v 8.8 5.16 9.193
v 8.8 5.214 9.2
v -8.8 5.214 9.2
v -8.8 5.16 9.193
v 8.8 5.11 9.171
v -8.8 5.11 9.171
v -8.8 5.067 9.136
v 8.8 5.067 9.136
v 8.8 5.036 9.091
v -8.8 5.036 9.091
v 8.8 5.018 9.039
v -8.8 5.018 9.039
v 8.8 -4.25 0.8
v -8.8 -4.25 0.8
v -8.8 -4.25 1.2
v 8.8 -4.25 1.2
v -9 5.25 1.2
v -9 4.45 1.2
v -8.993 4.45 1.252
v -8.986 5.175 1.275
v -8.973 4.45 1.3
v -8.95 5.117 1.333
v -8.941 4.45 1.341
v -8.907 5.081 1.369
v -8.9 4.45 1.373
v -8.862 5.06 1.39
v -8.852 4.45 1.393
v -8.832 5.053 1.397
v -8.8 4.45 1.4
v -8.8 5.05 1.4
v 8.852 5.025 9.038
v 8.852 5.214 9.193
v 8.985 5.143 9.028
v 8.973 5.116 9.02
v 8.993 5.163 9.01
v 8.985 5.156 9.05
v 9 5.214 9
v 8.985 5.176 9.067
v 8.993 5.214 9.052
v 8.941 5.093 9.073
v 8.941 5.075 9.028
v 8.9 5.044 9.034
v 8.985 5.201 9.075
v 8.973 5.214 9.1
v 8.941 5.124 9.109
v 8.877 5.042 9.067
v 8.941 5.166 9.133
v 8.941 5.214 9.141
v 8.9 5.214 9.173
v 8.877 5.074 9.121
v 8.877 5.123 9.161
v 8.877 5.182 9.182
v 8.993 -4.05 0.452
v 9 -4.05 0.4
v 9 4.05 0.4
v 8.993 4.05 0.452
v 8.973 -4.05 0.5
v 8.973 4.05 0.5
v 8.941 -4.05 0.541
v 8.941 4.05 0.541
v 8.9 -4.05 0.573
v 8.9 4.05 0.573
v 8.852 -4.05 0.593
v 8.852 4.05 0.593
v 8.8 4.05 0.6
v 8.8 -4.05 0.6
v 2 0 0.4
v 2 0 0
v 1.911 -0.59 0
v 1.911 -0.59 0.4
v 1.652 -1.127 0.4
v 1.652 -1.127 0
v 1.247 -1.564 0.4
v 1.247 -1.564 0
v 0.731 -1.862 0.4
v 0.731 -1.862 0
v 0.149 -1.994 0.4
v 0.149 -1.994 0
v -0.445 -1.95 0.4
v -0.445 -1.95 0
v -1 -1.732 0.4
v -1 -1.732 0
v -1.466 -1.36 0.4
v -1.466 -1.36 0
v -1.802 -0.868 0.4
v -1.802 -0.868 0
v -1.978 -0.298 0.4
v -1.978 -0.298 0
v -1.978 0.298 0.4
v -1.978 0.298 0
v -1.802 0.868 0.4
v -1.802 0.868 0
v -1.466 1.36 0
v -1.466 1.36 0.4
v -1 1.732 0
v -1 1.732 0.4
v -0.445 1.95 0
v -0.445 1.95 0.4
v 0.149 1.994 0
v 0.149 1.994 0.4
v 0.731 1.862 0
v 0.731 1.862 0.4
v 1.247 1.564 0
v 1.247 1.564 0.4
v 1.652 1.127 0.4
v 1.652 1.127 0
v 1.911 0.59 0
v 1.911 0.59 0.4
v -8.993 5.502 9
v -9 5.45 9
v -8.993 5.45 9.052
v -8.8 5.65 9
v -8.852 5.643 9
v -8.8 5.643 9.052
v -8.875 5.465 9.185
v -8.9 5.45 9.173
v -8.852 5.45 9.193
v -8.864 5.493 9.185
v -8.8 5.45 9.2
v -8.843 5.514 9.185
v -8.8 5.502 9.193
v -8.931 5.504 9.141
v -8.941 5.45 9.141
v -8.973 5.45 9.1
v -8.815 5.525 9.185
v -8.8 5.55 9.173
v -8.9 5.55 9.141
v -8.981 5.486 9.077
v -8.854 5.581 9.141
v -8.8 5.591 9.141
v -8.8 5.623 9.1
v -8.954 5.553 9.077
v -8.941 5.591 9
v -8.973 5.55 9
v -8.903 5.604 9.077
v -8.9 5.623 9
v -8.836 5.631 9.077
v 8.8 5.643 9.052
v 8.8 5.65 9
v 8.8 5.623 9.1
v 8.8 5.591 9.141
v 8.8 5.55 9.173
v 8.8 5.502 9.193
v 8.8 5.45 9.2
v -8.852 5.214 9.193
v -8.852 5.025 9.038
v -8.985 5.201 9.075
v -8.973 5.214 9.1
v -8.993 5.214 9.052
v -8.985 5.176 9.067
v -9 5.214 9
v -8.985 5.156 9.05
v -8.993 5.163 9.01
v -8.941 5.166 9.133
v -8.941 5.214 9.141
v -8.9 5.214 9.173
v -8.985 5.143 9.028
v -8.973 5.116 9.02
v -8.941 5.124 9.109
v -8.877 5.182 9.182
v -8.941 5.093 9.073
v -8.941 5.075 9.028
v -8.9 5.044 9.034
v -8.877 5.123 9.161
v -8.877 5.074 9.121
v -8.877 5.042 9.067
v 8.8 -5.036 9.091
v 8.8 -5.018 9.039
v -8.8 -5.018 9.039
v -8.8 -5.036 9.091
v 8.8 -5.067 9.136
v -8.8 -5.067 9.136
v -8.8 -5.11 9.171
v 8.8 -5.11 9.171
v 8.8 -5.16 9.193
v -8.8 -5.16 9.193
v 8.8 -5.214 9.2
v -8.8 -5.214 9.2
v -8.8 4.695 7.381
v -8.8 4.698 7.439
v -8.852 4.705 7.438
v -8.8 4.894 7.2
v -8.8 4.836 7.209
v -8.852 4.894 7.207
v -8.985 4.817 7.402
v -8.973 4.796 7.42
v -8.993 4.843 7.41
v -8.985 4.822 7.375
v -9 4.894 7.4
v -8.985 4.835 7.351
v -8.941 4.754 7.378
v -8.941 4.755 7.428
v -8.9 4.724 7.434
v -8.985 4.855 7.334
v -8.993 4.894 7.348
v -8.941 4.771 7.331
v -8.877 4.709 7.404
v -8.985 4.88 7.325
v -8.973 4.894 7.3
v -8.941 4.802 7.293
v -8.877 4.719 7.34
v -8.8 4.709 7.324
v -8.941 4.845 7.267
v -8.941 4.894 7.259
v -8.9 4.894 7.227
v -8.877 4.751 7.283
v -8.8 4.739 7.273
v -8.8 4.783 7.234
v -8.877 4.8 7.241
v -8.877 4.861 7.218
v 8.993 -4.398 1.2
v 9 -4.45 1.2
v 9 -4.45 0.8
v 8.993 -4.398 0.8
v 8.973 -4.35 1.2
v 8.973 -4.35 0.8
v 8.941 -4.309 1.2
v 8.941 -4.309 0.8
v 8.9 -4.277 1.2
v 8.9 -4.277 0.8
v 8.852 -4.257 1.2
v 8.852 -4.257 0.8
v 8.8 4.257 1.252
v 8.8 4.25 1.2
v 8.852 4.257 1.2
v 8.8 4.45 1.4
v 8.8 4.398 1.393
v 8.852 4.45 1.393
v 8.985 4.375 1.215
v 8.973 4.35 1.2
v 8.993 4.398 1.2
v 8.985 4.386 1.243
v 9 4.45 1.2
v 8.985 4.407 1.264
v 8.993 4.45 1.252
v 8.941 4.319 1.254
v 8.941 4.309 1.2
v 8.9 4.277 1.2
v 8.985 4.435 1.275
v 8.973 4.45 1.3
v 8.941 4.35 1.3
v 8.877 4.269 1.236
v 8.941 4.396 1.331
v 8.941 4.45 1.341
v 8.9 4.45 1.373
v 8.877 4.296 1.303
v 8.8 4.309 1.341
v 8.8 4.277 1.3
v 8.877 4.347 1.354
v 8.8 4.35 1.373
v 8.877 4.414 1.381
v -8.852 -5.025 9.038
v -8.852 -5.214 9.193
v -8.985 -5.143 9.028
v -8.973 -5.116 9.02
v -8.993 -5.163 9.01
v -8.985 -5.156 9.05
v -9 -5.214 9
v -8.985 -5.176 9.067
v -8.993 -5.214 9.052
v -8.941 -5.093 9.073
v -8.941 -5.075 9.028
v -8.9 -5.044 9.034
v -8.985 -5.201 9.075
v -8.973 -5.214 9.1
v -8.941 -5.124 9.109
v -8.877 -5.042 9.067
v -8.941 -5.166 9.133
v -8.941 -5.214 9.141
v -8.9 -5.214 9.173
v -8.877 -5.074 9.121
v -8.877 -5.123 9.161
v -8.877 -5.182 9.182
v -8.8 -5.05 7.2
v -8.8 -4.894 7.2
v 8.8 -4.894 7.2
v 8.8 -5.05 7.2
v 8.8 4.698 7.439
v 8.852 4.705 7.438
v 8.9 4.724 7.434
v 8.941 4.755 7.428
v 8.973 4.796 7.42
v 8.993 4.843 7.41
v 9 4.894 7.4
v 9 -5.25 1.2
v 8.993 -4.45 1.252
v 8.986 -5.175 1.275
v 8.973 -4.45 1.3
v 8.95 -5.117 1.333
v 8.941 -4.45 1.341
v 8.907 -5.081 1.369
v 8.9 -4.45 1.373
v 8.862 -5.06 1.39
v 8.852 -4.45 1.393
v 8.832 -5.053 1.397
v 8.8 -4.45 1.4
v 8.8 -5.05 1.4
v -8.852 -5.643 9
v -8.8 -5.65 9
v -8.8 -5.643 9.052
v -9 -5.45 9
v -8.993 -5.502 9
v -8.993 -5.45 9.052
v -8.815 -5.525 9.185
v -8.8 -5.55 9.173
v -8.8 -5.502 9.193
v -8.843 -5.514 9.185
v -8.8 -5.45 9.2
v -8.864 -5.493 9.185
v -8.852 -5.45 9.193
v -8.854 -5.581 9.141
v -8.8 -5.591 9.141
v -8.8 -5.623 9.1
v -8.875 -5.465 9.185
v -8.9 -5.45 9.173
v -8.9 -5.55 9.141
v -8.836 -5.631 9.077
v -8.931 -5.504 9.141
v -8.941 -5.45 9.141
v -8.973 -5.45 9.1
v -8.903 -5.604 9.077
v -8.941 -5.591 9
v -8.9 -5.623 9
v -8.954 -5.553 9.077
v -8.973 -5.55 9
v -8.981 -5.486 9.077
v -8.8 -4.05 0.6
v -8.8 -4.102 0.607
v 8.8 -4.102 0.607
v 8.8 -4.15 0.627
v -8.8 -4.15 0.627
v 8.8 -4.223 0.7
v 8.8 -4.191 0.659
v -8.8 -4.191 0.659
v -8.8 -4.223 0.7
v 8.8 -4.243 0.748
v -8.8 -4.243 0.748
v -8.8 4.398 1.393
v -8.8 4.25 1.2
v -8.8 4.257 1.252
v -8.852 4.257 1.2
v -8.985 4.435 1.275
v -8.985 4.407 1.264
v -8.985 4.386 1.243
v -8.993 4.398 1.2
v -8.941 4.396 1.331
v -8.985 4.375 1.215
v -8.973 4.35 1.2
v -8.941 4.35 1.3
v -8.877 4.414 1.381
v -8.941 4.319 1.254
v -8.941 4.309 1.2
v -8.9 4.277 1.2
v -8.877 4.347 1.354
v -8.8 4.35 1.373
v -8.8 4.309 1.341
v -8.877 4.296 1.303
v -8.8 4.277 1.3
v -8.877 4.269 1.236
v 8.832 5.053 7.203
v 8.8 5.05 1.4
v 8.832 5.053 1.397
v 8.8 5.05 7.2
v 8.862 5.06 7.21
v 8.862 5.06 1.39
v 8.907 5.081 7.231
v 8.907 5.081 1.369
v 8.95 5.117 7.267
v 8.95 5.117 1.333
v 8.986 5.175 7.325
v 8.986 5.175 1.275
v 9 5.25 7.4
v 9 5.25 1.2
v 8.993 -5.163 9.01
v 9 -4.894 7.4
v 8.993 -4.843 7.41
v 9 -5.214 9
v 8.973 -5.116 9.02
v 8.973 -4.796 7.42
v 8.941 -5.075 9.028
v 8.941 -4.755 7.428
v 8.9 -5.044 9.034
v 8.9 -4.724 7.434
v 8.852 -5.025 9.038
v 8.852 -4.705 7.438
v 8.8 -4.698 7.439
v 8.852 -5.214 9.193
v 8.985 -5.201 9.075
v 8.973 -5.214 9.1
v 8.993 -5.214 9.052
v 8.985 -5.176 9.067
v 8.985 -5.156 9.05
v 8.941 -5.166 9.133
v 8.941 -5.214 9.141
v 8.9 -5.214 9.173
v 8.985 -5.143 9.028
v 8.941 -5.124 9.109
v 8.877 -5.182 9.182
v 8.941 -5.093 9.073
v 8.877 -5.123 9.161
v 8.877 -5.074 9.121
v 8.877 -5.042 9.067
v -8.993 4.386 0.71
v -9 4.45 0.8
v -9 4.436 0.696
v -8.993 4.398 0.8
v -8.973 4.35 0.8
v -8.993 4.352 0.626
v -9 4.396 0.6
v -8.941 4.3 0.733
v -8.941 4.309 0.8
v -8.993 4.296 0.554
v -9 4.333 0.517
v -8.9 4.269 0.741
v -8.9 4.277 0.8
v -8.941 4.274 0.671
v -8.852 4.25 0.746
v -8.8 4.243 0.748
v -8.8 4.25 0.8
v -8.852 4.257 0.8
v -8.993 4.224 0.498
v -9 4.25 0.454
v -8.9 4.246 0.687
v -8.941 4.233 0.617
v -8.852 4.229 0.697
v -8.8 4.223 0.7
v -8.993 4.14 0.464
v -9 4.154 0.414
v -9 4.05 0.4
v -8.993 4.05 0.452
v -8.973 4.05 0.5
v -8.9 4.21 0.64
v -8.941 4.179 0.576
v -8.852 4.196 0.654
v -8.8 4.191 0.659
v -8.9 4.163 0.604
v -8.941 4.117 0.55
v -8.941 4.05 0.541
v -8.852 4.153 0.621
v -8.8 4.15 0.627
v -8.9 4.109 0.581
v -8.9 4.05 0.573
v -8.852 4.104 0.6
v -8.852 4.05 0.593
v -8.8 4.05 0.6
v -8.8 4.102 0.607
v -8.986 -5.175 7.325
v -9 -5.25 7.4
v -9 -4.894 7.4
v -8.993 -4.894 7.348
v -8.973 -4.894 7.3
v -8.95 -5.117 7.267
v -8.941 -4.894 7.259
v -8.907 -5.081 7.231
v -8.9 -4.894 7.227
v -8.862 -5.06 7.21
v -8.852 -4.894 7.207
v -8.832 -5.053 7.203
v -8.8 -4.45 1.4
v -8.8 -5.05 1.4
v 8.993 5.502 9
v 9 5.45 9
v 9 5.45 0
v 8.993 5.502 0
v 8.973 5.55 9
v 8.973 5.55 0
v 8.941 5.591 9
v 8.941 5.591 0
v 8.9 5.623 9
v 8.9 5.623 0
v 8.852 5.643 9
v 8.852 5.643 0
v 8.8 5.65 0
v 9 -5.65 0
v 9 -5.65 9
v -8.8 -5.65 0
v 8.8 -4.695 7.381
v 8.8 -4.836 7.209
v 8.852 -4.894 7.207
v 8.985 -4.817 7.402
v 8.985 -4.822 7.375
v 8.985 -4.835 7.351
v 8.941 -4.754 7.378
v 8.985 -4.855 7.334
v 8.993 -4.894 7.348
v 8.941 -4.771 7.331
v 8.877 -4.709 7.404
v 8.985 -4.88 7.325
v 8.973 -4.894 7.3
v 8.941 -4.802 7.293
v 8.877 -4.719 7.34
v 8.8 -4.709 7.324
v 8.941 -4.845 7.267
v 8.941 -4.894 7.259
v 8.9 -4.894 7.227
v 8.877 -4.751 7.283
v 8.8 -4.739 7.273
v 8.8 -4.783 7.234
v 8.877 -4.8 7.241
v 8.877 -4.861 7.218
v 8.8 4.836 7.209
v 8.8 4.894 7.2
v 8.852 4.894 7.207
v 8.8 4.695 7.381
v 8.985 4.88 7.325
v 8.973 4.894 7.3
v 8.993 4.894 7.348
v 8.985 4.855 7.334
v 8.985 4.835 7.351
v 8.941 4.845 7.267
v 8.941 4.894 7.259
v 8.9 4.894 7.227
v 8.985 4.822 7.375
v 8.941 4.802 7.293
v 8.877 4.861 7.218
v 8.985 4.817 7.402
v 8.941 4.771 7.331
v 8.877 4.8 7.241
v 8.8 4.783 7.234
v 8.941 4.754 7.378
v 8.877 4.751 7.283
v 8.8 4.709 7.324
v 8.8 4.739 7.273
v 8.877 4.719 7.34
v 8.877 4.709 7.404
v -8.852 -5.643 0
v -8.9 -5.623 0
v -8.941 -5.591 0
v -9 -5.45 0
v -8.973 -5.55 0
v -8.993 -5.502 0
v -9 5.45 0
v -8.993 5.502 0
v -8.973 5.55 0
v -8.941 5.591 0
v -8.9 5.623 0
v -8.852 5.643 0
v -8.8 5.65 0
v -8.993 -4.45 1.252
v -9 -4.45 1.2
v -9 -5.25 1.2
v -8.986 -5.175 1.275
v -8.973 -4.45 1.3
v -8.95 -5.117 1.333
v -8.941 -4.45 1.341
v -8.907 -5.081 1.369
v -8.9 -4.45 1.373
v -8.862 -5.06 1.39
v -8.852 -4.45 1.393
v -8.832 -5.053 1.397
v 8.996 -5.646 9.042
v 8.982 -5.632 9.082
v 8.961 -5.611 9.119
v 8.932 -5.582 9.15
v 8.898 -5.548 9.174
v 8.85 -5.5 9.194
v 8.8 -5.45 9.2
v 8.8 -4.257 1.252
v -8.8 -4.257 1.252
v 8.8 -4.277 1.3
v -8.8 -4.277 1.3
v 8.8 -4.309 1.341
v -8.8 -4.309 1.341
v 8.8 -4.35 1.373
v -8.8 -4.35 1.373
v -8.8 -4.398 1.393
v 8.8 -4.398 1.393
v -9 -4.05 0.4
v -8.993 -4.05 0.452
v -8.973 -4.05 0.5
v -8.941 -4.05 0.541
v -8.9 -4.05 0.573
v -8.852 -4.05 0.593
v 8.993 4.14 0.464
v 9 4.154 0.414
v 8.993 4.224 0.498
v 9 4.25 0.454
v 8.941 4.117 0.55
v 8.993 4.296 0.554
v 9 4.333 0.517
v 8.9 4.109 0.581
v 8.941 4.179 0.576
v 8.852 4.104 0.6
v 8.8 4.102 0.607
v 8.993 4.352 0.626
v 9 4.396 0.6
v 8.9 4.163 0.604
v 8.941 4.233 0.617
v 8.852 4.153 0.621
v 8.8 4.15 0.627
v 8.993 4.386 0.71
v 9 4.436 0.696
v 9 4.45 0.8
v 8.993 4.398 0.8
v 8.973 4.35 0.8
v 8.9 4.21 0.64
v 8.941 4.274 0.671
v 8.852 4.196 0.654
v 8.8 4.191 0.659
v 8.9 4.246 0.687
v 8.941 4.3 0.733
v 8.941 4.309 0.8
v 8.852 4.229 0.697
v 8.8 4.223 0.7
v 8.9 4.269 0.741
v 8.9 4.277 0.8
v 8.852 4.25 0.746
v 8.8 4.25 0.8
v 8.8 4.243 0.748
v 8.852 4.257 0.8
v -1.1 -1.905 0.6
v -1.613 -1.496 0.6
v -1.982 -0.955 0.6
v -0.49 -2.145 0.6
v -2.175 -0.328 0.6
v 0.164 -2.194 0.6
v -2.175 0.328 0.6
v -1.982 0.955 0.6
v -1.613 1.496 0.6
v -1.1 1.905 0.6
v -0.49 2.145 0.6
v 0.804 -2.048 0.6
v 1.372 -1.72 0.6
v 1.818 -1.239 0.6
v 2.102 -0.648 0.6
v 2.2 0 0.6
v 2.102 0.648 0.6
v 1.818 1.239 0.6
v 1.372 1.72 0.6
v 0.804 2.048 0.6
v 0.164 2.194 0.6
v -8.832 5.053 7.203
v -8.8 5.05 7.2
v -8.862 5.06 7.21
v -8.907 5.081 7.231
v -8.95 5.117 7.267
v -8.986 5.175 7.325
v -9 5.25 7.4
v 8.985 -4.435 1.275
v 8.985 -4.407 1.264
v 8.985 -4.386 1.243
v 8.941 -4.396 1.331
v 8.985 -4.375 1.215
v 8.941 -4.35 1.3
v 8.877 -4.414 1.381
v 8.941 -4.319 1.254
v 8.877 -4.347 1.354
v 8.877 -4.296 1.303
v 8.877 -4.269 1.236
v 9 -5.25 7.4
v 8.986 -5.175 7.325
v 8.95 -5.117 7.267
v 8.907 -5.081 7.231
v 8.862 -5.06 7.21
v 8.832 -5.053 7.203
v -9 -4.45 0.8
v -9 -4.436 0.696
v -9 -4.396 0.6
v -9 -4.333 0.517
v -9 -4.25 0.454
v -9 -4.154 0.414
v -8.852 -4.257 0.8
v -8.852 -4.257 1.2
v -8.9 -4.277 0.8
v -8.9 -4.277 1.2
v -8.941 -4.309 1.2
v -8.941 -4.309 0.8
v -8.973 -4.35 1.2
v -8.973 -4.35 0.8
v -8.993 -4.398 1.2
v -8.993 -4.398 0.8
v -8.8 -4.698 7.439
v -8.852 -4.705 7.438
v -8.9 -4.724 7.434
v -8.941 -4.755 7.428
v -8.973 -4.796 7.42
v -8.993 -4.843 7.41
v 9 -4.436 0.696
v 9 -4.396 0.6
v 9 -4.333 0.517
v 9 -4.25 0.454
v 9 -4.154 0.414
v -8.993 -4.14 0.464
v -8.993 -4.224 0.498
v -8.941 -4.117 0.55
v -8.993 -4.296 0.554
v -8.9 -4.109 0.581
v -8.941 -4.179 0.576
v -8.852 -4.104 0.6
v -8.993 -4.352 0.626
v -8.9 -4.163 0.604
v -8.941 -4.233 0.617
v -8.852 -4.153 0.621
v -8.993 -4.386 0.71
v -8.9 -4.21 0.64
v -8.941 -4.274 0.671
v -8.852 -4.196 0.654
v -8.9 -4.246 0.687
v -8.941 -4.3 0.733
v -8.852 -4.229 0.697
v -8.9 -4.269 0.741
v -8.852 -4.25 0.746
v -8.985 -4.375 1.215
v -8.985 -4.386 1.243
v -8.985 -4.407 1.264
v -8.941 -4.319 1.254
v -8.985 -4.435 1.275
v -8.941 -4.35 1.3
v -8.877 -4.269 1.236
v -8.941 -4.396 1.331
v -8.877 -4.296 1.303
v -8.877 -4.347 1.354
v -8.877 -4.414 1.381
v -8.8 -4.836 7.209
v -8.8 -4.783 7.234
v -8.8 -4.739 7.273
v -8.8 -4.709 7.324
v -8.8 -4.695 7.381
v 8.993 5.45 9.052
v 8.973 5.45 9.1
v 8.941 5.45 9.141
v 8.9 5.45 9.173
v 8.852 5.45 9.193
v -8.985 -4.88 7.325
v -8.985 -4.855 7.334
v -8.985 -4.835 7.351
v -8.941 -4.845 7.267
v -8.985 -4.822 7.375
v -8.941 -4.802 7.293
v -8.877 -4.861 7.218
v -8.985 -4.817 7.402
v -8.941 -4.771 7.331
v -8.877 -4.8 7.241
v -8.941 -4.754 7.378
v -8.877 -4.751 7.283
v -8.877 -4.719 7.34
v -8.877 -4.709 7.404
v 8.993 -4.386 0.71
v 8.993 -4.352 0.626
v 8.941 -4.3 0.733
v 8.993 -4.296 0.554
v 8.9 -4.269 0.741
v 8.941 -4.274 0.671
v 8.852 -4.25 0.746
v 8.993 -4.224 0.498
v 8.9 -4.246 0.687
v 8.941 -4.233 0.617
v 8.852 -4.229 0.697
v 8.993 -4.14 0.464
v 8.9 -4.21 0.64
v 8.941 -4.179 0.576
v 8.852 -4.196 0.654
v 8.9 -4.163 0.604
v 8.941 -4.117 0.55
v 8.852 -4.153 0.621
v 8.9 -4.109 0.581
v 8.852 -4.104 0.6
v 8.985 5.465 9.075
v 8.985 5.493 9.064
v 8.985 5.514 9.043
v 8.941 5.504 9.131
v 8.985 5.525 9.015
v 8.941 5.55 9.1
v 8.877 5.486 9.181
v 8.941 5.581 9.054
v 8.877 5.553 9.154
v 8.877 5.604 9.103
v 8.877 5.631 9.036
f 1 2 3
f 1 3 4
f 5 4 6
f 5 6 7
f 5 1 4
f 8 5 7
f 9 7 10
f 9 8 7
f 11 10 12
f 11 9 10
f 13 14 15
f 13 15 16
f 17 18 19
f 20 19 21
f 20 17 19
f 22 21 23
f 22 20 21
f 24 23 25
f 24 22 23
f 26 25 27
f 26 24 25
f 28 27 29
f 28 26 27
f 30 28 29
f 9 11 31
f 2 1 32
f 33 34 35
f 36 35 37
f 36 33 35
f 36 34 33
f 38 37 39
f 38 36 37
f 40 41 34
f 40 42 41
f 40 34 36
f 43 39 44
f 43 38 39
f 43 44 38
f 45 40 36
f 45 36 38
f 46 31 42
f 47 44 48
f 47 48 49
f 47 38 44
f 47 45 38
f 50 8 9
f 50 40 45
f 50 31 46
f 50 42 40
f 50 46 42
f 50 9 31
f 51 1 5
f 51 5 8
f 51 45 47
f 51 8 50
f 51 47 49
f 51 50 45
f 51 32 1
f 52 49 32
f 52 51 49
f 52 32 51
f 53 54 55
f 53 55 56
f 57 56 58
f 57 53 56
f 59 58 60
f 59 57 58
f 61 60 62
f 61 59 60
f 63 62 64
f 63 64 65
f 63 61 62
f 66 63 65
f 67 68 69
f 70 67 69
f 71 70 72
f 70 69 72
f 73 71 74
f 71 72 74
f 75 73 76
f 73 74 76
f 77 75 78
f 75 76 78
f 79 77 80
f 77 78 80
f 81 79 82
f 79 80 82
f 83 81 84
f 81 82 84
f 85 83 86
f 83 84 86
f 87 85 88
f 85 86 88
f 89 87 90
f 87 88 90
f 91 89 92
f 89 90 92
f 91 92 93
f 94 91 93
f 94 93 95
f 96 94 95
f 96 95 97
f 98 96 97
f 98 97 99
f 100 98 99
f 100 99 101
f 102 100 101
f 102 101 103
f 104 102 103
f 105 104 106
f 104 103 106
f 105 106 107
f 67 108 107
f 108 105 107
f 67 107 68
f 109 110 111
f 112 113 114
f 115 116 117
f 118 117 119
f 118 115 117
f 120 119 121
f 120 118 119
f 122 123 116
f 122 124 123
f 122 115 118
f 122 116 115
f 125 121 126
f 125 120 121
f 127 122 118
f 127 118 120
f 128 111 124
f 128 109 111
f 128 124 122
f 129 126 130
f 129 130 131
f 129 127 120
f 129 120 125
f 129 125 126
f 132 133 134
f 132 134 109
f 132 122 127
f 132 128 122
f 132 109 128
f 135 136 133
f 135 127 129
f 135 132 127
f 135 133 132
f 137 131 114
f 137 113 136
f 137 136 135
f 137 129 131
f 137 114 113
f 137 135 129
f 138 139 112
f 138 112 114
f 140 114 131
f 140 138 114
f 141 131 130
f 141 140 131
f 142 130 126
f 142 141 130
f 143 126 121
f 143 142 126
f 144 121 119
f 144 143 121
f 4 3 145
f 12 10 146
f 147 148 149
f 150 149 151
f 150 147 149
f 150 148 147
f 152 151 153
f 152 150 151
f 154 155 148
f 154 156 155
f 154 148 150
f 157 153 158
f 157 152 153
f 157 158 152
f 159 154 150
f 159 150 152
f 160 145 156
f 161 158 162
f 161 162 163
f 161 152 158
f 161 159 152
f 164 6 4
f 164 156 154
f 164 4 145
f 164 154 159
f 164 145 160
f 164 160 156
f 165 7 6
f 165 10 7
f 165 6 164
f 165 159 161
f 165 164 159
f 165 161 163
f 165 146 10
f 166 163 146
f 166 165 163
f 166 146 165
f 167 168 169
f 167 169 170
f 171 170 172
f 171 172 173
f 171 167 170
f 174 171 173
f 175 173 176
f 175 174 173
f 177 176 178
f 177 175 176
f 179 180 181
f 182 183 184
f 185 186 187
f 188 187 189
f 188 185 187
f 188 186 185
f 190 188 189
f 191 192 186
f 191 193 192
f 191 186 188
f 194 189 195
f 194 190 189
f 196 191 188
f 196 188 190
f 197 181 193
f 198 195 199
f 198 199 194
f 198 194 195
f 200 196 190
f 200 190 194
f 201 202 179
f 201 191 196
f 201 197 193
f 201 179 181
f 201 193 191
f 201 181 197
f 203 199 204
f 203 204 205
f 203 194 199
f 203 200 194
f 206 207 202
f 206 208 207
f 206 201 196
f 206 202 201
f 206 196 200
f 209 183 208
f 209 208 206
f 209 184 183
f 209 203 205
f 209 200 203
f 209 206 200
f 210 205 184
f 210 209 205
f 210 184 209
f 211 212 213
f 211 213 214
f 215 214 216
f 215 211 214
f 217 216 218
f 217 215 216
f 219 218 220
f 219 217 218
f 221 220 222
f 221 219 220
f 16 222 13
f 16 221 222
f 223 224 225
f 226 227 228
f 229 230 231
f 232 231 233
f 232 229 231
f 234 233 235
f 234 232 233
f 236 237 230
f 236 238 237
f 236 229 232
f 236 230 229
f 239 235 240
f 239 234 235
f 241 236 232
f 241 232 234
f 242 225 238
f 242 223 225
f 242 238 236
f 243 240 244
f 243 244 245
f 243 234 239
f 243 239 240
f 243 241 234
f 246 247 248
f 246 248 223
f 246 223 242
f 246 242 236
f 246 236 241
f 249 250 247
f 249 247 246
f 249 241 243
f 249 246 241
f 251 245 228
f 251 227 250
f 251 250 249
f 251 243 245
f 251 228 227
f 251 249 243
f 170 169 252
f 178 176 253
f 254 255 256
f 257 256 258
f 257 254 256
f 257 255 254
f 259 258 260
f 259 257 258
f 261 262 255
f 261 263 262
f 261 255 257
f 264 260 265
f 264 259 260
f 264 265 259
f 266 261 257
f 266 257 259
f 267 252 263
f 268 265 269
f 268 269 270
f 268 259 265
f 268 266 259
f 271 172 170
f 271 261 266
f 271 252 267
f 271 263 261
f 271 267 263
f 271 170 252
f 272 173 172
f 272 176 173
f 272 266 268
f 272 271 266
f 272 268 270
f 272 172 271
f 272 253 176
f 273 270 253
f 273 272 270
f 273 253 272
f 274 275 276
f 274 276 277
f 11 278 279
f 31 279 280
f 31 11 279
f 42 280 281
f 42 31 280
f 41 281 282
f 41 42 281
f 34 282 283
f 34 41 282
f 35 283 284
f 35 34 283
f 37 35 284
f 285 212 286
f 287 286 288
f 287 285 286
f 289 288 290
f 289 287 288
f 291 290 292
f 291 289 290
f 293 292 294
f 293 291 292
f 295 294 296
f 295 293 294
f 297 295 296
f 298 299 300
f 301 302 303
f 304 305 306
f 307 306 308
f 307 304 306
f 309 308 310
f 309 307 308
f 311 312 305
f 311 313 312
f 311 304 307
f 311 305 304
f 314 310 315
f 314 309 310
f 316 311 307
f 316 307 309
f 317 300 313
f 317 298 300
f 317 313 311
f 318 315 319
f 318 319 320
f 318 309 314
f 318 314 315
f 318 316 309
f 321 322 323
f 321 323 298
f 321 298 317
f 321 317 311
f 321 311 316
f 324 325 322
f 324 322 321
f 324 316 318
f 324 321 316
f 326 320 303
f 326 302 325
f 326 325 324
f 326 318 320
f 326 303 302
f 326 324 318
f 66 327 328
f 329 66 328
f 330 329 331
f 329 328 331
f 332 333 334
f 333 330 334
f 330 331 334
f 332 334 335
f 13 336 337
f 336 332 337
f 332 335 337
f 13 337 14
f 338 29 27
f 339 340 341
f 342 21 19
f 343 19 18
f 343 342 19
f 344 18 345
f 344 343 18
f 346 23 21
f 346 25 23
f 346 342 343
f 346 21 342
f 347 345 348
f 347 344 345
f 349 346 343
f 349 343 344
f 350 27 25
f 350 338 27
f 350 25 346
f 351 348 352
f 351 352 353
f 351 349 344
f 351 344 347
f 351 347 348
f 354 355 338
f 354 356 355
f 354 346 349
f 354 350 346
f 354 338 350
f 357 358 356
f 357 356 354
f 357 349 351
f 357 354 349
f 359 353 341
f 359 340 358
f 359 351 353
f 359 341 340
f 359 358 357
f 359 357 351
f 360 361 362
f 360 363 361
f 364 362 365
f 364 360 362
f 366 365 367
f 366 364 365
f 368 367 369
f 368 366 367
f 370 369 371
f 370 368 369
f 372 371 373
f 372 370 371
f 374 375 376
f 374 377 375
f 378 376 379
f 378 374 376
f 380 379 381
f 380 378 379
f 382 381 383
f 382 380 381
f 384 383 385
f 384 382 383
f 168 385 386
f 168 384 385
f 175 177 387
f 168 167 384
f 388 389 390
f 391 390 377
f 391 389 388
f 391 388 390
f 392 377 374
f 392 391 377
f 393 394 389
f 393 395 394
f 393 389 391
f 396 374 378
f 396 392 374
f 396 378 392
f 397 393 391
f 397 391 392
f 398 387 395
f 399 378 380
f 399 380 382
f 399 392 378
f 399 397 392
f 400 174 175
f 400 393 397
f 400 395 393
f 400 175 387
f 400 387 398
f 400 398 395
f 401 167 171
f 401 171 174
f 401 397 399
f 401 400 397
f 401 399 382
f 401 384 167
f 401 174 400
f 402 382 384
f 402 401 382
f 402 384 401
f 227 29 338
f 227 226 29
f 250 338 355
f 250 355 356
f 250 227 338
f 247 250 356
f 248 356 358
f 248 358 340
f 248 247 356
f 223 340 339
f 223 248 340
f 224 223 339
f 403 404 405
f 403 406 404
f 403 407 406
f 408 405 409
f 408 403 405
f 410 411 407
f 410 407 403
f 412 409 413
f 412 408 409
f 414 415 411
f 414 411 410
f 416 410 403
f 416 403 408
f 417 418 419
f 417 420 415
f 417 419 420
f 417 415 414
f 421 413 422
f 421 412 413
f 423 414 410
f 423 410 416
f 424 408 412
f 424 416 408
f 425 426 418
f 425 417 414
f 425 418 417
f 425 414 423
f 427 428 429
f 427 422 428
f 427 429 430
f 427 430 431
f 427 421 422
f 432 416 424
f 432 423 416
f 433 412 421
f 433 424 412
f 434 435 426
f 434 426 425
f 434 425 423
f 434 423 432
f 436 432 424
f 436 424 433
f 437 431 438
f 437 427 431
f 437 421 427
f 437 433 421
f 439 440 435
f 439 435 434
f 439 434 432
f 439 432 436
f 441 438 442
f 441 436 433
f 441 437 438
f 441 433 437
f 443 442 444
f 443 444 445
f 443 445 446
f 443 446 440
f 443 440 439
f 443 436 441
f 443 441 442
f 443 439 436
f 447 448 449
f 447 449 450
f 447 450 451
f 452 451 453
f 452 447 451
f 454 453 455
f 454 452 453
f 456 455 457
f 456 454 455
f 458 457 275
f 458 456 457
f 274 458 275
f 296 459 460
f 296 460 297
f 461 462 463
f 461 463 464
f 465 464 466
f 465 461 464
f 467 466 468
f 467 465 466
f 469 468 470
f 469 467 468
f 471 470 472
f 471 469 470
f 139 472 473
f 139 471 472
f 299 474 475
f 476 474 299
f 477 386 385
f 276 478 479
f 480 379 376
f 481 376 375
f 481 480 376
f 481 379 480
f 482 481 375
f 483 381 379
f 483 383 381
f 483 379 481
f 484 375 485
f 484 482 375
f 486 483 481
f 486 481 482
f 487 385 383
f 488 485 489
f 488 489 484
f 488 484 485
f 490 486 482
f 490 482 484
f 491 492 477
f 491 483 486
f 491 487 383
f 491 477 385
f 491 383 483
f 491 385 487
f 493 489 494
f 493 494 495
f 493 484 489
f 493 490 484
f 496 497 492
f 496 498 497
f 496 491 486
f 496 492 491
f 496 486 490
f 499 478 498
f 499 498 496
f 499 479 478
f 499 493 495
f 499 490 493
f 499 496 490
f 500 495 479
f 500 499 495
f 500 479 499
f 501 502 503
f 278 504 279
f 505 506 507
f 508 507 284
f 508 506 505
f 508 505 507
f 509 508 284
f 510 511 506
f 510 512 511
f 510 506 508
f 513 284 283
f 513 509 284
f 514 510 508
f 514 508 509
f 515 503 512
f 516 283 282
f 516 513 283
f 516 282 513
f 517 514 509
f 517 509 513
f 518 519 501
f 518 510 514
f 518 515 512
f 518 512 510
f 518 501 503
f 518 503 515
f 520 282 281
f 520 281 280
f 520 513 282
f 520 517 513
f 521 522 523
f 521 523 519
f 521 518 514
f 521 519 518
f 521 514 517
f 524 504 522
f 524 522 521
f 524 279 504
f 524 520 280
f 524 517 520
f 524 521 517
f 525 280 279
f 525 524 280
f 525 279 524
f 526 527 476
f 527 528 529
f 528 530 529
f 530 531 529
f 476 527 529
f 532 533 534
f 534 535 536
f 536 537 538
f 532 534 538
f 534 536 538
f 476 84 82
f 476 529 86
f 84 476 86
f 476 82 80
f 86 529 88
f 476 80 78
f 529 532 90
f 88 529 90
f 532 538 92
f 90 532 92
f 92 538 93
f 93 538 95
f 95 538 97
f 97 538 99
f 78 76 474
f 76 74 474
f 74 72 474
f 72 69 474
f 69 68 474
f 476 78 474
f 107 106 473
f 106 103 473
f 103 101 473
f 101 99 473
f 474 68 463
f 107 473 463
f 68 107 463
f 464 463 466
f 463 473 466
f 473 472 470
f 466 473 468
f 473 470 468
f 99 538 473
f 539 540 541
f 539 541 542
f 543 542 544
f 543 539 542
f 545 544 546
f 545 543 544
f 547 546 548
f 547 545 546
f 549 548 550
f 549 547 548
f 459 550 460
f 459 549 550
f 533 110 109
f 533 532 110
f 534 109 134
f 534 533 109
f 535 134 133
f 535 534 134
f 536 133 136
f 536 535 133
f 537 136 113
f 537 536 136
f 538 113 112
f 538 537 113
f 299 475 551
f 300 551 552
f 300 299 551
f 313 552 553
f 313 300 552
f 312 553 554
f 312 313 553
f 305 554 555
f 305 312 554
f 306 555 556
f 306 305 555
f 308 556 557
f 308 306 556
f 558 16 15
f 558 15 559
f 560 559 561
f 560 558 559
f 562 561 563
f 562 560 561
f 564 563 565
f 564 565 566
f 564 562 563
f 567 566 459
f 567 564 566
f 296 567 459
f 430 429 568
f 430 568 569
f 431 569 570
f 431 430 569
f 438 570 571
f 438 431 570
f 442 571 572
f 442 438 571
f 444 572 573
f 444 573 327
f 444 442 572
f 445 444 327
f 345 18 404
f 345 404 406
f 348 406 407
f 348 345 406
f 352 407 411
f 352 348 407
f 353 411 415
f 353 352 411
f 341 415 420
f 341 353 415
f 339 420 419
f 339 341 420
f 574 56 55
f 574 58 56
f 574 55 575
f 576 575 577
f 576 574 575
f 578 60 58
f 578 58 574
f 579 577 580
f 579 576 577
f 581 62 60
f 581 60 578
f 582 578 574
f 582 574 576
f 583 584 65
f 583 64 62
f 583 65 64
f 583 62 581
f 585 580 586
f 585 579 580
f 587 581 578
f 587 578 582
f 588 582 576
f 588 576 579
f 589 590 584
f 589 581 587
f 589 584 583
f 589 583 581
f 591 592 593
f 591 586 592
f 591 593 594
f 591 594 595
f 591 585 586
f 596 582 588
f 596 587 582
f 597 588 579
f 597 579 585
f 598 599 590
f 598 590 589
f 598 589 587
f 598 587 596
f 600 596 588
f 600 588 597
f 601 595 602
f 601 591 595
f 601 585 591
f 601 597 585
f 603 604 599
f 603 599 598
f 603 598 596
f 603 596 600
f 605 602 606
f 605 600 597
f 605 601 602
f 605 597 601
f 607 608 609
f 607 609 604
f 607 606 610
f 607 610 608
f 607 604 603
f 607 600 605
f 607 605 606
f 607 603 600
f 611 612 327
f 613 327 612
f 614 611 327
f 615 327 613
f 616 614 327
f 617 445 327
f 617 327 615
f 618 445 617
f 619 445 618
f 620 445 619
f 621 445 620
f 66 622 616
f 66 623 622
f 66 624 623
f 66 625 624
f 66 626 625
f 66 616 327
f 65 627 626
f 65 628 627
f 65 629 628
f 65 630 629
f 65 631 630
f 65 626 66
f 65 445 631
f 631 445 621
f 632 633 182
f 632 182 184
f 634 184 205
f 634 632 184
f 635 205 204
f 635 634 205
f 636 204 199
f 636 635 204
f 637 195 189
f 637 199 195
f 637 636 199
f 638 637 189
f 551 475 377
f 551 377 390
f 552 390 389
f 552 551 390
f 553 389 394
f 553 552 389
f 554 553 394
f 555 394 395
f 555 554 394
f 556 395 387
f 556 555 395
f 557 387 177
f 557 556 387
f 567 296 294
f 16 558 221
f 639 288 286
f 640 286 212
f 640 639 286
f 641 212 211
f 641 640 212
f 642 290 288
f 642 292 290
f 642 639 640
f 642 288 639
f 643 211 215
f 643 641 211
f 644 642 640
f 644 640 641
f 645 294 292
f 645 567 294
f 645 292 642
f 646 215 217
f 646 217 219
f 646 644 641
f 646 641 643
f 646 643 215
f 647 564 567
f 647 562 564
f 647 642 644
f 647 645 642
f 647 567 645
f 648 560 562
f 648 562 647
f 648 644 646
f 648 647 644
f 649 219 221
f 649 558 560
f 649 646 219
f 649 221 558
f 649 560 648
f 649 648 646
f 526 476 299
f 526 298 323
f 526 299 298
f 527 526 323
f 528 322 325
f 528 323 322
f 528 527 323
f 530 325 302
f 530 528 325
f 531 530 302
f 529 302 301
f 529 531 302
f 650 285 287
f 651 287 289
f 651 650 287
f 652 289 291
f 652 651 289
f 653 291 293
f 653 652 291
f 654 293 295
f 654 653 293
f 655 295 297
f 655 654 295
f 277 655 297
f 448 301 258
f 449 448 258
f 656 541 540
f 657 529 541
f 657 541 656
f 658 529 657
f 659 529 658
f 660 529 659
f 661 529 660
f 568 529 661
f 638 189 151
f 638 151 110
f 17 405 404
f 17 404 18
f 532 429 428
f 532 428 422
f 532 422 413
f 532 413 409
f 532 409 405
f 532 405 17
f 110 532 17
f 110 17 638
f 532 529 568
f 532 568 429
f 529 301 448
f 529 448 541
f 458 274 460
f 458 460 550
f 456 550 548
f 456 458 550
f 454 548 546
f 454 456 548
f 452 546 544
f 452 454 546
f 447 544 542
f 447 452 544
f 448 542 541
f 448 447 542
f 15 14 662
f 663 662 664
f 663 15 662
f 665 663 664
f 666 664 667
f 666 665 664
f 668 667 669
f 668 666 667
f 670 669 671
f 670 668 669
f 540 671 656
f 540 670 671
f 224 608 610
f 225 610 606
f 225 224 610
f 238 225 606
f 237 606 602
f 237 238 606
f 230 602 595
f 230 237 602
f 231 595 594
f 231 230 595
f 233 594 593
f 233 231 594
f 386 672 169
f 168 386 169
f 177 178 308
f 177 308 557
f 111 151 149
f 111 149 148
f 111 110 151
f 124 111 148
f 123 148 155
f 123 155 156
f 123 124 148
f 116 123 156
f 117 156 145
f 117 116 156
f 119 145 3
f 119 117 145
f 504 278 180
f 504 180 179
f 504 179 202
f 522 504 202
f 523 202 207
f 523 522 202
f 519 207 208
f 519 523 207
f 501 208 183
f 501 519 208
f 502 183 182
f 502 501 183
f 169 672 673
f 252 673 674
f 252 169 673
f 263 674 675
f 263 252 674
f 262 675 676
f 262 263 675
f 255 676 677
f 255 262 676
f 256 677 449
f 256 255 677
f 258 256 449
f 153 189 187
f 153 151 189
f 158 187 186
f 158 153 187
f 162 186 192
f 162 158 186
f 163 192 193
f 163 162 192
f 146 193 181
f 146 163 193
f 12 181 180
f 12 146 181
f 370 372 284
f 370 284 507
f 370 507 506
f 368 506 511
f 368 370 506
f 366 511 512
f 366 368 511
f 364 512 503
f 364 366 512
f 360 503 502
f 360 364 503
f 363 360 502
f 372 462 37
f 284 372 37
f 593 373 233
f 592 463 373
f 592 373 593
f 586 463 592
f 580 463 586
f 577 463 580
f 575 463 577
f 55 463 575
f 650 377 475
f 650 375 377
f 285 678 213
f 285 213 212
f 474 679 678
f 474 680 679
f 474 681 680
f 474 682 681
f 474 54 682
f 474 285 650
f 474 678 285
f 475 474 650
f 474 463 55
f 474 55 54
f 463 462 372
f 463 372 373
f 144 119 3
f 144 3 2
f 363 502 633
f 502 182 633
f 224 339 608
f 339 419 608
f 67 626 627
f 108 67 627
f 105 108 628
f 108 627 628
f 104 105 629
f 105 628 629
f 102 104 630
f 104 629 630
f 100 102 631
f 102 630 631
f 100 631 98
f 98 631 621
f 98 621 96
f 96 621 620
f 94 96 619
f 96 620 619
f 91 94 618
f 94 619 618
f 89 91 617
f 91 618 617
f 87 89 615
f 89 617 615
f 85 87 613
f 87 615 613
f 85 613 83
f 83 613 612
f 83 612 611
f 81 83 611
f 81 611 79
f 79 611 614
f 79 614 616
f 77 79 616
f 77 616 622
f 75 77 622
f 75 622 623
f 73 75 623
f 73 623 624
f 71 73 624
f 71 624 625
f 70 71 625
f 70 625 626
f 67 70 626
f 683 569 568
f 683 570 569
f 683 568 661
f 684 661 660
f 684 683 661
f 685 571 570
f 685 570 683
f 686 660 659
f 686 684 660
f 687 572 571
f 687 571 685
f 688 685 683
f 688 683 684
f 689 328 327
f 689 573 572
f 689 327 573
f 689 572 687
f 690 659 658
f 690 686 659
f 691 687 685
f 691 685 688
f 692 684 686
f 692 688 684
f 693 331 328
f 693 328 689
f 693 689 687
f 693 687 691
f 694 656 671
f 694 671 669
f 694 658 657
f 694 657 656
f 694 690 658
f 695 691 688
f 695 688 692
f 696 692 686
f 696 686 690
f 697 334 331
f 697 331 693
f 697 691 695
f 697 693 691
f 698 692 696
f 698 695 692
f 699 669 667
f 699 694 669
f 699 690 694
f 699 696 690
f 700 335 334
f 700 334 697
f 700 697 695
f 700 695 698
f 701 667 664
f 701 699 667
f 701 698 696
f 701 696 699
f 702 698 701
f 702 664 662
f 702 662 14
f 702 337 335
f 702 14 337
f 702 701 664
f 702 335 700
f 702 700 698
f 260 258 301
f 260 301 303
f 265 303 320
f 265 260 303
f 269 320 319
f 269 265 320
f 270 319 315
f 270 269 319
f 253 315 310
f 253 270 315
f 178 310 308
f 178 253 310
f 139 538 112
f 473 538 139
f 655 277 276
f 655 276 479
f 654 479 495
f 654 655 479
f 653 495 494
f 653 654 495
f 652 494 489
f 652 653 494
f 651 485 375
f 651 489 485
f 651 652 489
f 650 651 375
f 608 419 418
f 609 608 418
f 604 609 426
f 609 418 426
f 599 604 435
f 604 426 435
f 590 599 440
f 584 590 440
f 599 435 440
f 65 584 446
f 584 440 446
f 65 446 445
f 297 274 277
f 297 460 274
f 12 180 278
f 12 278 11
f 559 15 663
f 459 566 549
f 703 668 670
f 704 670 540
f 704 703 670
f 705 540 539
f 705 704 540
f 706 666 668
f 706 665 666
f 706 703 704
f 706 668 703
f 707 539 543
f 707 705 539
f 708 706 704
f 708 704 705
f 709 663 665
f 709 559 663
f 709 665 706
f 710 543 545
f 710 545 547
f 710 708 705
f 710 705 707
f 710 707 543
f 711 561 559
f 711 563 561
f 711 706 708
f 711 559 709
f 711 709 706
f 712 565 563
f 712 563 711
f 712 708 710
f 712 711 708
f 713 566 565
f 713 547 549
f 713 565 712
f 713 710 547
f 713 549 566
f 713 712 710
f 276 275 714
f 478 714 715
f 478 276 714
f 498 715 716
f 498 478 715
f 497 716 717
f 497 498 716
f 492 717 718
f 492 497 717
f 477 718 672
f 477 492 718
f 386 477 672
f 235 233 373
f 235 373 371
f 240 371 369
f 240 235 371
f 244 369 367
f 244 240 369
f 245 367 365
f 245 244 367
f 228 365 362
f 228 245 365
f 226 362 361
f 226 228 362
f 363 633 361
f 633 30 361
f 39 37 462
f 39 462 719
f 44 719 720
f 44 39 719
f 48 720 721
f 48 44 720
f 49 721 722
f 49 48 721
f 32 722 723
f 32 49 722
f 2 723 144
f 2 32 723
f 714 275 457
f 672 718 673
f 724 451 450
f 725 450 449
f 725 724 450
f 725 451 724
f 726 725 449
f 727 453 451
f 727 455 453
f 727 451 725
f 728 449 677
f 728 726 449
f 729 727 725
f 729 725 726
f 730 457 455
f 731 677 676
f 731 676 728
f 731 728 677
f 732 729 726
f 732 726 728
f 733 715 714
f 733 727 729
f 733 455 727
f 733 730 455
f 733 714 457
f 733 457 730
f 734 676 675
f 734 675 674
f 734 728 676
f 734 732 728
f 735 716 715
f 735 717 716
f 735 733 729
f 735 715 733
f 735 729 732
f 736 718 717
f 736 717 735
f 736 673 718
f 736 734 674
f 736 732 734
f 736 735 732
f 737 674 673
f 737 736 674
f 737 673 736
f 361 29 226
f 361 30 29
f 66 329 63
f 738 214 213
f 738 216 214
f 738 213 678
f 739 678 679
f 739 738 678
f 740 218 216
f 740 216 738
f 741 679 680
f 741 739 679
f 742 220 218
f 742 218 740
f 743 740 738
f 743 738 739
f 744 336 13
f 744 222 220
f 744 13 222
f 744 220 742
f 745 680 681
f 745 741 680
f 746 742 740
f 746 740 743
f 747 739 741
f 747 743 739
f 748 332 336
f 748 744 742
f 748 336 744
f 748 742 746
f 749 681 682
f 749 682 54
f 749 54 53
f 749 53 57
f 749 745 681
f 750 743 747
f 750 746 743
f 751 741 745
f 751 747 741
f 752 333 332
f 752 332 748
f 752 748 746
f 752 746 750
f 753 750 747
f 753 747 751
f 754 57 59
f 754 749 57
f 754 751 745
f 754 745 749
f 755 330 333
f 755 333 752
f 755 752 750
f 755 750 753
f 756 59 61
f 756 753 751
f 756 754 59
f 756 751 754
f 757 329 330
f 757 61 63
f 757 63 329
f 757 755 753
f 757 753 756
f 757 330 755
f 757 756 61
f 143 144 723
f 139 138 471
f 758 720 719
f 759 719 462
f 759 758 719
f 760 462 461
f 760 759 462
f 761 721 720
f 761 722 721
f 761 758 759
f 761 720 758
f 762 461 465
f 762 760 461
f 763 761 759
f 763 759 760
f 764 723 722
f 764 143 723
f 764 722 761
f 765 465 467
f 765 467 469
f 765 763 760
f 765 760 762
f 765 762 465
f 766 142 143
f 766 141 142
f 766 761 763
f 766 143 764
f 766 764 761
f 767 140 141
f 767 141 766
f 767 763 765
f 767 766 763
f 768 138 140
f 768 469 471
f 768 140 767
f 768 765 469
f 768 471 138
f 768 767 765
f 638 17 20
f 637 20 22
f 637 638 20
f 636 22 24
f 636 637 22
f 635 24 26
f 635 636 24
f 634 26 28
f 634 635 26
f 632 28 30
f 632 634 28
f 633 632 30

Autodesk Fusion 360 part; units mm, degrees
sketch "Sketch1" plane through (0, 0, 0) normal (0, 0, 1) x (1, 0, 0)
  line L0 (9, -5.65) -> (-9, -5.65)
  line L1 (-9, -5.65) -> (-9, 5.65)
  line L2 (-9, 5.65) -> (9, 5.65)
  line L3 (9, 5.65) -> (9, -5.65)
  line L4 (9, -5.65) -> (-9, 5.65) construction
  line L5 (-9, -5.65) -> (9, 5.65) construction
  line L6 (-9, 4.25) -> (9, 4.25)
  line L7 (-9, -4.25) -> (9, -4.25)
  line L8 (-9, 5.05) -> (9, 5.05)
  line L9 (-9, -5.05) -> (9, -5.05)
  circle A0 centre (0, 0) radius 2
  dimension "d1" = 18
  dimension "d2" = 11.3
  dimension "d5" = 1.4
  dimension "d6" = 1.4
  dimension "d9" = 0.6
  dimension "d10" = 0.6
  dimension "d21" = 4
extrude "Extrude1" add sketch "Sketch1" along normal blind 0.6
extrude "Extrude2" add sketch "Sketch1" along normal blind 1.4 contours L0 L1 L3 L9 | L1 L3 L7 L9 | L1 L3 L6 L8 | L1 L2 L3 L8
extrude "Extrude3" add sketch "Sketch1" along normal blind 9.2 contours L0 L1 L3 L9 | L1 L2 L3 L8
sketch "Sketch2" plane through (-9, 0, 0) normal (-1, 0, 0) x (0, -1, 0)
  line L0 (5.05, 1.4) -> (4.25, 1.4)
  line L1 (4.25, 1.4) -> (4.25, 0.6)
  line L2 (4.25, 0.6) -> (-4.25, 0.6)
  line L3 (-4.25, 0.6) -> (-4.25, 1.4)
  line L4 (-4.25, 1.4) -> (-5.05, 1.4)
  line L5 (-5.05, 1.4) -> (-5.05, 9.2)
  line L6 (-5.05, 9.2) -> (-5.65, 9.2)
  line L7 (-5.65, 9.2) -> (-5.65, 0)
  line L8 (-5.65, 0) -> (5.65, 0)
  line L9 (5.05, 9.2) -> (5.05, 1.4)
  line L10 (4.65, 7.2) -> (5.05, 7.2)
  line L11 (4.65, 7.2) -> (5.05, 9.2)
  line L12 (5.05, 7.2) -> (5.05, 9.2)
  line L13 (0, 0) -> (0, 9)
  line L14 (-4.65, 7.2) -> (-5.05, 9.2)
  line L15 (-5.05, 7.2) -> (-5.05, 9.2)
  line L16 (-4.65, 7.2) -> (-5.05, 7.2)
  point P0 (-5.05, 9.2)
extrude "Extrude4" add sketch "Sketch2" against normal blind 18 contours L9 L10 L11 L12 | L5 L14 L15 L16
fillet "Fillet1" radius 0.2 39 edges at (0, 4.65, 7.2) (0, -4.65, 7.2) (0, -4.25, 1.4) (0, 4.25, 1.4) (0, 4.25, 0.6) (0, -4.25, 0.6) (-9, 5.65, 4.6) (-9, 4.85, 8.2) (-9, 5.05, 4.3) (-9, 4.85, 7.2) (-9, -4.85, 7.2) (-9, -5.05, 4.3) (-9, -4.85, 8.2) (9, -4.85, 8.2) (9, -4.85, 7.2) (9, -5.05, 4.3) (9, 5.05, 4.3) (9, 4.85, 8.2) (9, 4.85, 7.2) (9, -4.65, 1.4) (9, 4.65, 1.4) (9, 4.25, 1) (9, -4.25, 1) (9, 0, 0.6) (-9, 0, 0.6) (-9, 4.65, 1.4) (-9, 4.25, 1) (-9, -4.25, 1) (-9, -4.65, 1.4) (-9, -5.65, 4.6) (-9, -5.35, 9.2) (0, -5.65, 9.2) (0, 5.65, 9.2) (0, 5.05, 9.2) (-9, 5.35, 9.2) (9, 5.35, 9.2) (9, -5.35, 9.2) (0, -5.05, 9.2) (9, 5.65, 4.6)
chamfer "Chamfer1" distance 0.2 angle 45 1 edges at (-1.8647, 0.7232, 0.6)
